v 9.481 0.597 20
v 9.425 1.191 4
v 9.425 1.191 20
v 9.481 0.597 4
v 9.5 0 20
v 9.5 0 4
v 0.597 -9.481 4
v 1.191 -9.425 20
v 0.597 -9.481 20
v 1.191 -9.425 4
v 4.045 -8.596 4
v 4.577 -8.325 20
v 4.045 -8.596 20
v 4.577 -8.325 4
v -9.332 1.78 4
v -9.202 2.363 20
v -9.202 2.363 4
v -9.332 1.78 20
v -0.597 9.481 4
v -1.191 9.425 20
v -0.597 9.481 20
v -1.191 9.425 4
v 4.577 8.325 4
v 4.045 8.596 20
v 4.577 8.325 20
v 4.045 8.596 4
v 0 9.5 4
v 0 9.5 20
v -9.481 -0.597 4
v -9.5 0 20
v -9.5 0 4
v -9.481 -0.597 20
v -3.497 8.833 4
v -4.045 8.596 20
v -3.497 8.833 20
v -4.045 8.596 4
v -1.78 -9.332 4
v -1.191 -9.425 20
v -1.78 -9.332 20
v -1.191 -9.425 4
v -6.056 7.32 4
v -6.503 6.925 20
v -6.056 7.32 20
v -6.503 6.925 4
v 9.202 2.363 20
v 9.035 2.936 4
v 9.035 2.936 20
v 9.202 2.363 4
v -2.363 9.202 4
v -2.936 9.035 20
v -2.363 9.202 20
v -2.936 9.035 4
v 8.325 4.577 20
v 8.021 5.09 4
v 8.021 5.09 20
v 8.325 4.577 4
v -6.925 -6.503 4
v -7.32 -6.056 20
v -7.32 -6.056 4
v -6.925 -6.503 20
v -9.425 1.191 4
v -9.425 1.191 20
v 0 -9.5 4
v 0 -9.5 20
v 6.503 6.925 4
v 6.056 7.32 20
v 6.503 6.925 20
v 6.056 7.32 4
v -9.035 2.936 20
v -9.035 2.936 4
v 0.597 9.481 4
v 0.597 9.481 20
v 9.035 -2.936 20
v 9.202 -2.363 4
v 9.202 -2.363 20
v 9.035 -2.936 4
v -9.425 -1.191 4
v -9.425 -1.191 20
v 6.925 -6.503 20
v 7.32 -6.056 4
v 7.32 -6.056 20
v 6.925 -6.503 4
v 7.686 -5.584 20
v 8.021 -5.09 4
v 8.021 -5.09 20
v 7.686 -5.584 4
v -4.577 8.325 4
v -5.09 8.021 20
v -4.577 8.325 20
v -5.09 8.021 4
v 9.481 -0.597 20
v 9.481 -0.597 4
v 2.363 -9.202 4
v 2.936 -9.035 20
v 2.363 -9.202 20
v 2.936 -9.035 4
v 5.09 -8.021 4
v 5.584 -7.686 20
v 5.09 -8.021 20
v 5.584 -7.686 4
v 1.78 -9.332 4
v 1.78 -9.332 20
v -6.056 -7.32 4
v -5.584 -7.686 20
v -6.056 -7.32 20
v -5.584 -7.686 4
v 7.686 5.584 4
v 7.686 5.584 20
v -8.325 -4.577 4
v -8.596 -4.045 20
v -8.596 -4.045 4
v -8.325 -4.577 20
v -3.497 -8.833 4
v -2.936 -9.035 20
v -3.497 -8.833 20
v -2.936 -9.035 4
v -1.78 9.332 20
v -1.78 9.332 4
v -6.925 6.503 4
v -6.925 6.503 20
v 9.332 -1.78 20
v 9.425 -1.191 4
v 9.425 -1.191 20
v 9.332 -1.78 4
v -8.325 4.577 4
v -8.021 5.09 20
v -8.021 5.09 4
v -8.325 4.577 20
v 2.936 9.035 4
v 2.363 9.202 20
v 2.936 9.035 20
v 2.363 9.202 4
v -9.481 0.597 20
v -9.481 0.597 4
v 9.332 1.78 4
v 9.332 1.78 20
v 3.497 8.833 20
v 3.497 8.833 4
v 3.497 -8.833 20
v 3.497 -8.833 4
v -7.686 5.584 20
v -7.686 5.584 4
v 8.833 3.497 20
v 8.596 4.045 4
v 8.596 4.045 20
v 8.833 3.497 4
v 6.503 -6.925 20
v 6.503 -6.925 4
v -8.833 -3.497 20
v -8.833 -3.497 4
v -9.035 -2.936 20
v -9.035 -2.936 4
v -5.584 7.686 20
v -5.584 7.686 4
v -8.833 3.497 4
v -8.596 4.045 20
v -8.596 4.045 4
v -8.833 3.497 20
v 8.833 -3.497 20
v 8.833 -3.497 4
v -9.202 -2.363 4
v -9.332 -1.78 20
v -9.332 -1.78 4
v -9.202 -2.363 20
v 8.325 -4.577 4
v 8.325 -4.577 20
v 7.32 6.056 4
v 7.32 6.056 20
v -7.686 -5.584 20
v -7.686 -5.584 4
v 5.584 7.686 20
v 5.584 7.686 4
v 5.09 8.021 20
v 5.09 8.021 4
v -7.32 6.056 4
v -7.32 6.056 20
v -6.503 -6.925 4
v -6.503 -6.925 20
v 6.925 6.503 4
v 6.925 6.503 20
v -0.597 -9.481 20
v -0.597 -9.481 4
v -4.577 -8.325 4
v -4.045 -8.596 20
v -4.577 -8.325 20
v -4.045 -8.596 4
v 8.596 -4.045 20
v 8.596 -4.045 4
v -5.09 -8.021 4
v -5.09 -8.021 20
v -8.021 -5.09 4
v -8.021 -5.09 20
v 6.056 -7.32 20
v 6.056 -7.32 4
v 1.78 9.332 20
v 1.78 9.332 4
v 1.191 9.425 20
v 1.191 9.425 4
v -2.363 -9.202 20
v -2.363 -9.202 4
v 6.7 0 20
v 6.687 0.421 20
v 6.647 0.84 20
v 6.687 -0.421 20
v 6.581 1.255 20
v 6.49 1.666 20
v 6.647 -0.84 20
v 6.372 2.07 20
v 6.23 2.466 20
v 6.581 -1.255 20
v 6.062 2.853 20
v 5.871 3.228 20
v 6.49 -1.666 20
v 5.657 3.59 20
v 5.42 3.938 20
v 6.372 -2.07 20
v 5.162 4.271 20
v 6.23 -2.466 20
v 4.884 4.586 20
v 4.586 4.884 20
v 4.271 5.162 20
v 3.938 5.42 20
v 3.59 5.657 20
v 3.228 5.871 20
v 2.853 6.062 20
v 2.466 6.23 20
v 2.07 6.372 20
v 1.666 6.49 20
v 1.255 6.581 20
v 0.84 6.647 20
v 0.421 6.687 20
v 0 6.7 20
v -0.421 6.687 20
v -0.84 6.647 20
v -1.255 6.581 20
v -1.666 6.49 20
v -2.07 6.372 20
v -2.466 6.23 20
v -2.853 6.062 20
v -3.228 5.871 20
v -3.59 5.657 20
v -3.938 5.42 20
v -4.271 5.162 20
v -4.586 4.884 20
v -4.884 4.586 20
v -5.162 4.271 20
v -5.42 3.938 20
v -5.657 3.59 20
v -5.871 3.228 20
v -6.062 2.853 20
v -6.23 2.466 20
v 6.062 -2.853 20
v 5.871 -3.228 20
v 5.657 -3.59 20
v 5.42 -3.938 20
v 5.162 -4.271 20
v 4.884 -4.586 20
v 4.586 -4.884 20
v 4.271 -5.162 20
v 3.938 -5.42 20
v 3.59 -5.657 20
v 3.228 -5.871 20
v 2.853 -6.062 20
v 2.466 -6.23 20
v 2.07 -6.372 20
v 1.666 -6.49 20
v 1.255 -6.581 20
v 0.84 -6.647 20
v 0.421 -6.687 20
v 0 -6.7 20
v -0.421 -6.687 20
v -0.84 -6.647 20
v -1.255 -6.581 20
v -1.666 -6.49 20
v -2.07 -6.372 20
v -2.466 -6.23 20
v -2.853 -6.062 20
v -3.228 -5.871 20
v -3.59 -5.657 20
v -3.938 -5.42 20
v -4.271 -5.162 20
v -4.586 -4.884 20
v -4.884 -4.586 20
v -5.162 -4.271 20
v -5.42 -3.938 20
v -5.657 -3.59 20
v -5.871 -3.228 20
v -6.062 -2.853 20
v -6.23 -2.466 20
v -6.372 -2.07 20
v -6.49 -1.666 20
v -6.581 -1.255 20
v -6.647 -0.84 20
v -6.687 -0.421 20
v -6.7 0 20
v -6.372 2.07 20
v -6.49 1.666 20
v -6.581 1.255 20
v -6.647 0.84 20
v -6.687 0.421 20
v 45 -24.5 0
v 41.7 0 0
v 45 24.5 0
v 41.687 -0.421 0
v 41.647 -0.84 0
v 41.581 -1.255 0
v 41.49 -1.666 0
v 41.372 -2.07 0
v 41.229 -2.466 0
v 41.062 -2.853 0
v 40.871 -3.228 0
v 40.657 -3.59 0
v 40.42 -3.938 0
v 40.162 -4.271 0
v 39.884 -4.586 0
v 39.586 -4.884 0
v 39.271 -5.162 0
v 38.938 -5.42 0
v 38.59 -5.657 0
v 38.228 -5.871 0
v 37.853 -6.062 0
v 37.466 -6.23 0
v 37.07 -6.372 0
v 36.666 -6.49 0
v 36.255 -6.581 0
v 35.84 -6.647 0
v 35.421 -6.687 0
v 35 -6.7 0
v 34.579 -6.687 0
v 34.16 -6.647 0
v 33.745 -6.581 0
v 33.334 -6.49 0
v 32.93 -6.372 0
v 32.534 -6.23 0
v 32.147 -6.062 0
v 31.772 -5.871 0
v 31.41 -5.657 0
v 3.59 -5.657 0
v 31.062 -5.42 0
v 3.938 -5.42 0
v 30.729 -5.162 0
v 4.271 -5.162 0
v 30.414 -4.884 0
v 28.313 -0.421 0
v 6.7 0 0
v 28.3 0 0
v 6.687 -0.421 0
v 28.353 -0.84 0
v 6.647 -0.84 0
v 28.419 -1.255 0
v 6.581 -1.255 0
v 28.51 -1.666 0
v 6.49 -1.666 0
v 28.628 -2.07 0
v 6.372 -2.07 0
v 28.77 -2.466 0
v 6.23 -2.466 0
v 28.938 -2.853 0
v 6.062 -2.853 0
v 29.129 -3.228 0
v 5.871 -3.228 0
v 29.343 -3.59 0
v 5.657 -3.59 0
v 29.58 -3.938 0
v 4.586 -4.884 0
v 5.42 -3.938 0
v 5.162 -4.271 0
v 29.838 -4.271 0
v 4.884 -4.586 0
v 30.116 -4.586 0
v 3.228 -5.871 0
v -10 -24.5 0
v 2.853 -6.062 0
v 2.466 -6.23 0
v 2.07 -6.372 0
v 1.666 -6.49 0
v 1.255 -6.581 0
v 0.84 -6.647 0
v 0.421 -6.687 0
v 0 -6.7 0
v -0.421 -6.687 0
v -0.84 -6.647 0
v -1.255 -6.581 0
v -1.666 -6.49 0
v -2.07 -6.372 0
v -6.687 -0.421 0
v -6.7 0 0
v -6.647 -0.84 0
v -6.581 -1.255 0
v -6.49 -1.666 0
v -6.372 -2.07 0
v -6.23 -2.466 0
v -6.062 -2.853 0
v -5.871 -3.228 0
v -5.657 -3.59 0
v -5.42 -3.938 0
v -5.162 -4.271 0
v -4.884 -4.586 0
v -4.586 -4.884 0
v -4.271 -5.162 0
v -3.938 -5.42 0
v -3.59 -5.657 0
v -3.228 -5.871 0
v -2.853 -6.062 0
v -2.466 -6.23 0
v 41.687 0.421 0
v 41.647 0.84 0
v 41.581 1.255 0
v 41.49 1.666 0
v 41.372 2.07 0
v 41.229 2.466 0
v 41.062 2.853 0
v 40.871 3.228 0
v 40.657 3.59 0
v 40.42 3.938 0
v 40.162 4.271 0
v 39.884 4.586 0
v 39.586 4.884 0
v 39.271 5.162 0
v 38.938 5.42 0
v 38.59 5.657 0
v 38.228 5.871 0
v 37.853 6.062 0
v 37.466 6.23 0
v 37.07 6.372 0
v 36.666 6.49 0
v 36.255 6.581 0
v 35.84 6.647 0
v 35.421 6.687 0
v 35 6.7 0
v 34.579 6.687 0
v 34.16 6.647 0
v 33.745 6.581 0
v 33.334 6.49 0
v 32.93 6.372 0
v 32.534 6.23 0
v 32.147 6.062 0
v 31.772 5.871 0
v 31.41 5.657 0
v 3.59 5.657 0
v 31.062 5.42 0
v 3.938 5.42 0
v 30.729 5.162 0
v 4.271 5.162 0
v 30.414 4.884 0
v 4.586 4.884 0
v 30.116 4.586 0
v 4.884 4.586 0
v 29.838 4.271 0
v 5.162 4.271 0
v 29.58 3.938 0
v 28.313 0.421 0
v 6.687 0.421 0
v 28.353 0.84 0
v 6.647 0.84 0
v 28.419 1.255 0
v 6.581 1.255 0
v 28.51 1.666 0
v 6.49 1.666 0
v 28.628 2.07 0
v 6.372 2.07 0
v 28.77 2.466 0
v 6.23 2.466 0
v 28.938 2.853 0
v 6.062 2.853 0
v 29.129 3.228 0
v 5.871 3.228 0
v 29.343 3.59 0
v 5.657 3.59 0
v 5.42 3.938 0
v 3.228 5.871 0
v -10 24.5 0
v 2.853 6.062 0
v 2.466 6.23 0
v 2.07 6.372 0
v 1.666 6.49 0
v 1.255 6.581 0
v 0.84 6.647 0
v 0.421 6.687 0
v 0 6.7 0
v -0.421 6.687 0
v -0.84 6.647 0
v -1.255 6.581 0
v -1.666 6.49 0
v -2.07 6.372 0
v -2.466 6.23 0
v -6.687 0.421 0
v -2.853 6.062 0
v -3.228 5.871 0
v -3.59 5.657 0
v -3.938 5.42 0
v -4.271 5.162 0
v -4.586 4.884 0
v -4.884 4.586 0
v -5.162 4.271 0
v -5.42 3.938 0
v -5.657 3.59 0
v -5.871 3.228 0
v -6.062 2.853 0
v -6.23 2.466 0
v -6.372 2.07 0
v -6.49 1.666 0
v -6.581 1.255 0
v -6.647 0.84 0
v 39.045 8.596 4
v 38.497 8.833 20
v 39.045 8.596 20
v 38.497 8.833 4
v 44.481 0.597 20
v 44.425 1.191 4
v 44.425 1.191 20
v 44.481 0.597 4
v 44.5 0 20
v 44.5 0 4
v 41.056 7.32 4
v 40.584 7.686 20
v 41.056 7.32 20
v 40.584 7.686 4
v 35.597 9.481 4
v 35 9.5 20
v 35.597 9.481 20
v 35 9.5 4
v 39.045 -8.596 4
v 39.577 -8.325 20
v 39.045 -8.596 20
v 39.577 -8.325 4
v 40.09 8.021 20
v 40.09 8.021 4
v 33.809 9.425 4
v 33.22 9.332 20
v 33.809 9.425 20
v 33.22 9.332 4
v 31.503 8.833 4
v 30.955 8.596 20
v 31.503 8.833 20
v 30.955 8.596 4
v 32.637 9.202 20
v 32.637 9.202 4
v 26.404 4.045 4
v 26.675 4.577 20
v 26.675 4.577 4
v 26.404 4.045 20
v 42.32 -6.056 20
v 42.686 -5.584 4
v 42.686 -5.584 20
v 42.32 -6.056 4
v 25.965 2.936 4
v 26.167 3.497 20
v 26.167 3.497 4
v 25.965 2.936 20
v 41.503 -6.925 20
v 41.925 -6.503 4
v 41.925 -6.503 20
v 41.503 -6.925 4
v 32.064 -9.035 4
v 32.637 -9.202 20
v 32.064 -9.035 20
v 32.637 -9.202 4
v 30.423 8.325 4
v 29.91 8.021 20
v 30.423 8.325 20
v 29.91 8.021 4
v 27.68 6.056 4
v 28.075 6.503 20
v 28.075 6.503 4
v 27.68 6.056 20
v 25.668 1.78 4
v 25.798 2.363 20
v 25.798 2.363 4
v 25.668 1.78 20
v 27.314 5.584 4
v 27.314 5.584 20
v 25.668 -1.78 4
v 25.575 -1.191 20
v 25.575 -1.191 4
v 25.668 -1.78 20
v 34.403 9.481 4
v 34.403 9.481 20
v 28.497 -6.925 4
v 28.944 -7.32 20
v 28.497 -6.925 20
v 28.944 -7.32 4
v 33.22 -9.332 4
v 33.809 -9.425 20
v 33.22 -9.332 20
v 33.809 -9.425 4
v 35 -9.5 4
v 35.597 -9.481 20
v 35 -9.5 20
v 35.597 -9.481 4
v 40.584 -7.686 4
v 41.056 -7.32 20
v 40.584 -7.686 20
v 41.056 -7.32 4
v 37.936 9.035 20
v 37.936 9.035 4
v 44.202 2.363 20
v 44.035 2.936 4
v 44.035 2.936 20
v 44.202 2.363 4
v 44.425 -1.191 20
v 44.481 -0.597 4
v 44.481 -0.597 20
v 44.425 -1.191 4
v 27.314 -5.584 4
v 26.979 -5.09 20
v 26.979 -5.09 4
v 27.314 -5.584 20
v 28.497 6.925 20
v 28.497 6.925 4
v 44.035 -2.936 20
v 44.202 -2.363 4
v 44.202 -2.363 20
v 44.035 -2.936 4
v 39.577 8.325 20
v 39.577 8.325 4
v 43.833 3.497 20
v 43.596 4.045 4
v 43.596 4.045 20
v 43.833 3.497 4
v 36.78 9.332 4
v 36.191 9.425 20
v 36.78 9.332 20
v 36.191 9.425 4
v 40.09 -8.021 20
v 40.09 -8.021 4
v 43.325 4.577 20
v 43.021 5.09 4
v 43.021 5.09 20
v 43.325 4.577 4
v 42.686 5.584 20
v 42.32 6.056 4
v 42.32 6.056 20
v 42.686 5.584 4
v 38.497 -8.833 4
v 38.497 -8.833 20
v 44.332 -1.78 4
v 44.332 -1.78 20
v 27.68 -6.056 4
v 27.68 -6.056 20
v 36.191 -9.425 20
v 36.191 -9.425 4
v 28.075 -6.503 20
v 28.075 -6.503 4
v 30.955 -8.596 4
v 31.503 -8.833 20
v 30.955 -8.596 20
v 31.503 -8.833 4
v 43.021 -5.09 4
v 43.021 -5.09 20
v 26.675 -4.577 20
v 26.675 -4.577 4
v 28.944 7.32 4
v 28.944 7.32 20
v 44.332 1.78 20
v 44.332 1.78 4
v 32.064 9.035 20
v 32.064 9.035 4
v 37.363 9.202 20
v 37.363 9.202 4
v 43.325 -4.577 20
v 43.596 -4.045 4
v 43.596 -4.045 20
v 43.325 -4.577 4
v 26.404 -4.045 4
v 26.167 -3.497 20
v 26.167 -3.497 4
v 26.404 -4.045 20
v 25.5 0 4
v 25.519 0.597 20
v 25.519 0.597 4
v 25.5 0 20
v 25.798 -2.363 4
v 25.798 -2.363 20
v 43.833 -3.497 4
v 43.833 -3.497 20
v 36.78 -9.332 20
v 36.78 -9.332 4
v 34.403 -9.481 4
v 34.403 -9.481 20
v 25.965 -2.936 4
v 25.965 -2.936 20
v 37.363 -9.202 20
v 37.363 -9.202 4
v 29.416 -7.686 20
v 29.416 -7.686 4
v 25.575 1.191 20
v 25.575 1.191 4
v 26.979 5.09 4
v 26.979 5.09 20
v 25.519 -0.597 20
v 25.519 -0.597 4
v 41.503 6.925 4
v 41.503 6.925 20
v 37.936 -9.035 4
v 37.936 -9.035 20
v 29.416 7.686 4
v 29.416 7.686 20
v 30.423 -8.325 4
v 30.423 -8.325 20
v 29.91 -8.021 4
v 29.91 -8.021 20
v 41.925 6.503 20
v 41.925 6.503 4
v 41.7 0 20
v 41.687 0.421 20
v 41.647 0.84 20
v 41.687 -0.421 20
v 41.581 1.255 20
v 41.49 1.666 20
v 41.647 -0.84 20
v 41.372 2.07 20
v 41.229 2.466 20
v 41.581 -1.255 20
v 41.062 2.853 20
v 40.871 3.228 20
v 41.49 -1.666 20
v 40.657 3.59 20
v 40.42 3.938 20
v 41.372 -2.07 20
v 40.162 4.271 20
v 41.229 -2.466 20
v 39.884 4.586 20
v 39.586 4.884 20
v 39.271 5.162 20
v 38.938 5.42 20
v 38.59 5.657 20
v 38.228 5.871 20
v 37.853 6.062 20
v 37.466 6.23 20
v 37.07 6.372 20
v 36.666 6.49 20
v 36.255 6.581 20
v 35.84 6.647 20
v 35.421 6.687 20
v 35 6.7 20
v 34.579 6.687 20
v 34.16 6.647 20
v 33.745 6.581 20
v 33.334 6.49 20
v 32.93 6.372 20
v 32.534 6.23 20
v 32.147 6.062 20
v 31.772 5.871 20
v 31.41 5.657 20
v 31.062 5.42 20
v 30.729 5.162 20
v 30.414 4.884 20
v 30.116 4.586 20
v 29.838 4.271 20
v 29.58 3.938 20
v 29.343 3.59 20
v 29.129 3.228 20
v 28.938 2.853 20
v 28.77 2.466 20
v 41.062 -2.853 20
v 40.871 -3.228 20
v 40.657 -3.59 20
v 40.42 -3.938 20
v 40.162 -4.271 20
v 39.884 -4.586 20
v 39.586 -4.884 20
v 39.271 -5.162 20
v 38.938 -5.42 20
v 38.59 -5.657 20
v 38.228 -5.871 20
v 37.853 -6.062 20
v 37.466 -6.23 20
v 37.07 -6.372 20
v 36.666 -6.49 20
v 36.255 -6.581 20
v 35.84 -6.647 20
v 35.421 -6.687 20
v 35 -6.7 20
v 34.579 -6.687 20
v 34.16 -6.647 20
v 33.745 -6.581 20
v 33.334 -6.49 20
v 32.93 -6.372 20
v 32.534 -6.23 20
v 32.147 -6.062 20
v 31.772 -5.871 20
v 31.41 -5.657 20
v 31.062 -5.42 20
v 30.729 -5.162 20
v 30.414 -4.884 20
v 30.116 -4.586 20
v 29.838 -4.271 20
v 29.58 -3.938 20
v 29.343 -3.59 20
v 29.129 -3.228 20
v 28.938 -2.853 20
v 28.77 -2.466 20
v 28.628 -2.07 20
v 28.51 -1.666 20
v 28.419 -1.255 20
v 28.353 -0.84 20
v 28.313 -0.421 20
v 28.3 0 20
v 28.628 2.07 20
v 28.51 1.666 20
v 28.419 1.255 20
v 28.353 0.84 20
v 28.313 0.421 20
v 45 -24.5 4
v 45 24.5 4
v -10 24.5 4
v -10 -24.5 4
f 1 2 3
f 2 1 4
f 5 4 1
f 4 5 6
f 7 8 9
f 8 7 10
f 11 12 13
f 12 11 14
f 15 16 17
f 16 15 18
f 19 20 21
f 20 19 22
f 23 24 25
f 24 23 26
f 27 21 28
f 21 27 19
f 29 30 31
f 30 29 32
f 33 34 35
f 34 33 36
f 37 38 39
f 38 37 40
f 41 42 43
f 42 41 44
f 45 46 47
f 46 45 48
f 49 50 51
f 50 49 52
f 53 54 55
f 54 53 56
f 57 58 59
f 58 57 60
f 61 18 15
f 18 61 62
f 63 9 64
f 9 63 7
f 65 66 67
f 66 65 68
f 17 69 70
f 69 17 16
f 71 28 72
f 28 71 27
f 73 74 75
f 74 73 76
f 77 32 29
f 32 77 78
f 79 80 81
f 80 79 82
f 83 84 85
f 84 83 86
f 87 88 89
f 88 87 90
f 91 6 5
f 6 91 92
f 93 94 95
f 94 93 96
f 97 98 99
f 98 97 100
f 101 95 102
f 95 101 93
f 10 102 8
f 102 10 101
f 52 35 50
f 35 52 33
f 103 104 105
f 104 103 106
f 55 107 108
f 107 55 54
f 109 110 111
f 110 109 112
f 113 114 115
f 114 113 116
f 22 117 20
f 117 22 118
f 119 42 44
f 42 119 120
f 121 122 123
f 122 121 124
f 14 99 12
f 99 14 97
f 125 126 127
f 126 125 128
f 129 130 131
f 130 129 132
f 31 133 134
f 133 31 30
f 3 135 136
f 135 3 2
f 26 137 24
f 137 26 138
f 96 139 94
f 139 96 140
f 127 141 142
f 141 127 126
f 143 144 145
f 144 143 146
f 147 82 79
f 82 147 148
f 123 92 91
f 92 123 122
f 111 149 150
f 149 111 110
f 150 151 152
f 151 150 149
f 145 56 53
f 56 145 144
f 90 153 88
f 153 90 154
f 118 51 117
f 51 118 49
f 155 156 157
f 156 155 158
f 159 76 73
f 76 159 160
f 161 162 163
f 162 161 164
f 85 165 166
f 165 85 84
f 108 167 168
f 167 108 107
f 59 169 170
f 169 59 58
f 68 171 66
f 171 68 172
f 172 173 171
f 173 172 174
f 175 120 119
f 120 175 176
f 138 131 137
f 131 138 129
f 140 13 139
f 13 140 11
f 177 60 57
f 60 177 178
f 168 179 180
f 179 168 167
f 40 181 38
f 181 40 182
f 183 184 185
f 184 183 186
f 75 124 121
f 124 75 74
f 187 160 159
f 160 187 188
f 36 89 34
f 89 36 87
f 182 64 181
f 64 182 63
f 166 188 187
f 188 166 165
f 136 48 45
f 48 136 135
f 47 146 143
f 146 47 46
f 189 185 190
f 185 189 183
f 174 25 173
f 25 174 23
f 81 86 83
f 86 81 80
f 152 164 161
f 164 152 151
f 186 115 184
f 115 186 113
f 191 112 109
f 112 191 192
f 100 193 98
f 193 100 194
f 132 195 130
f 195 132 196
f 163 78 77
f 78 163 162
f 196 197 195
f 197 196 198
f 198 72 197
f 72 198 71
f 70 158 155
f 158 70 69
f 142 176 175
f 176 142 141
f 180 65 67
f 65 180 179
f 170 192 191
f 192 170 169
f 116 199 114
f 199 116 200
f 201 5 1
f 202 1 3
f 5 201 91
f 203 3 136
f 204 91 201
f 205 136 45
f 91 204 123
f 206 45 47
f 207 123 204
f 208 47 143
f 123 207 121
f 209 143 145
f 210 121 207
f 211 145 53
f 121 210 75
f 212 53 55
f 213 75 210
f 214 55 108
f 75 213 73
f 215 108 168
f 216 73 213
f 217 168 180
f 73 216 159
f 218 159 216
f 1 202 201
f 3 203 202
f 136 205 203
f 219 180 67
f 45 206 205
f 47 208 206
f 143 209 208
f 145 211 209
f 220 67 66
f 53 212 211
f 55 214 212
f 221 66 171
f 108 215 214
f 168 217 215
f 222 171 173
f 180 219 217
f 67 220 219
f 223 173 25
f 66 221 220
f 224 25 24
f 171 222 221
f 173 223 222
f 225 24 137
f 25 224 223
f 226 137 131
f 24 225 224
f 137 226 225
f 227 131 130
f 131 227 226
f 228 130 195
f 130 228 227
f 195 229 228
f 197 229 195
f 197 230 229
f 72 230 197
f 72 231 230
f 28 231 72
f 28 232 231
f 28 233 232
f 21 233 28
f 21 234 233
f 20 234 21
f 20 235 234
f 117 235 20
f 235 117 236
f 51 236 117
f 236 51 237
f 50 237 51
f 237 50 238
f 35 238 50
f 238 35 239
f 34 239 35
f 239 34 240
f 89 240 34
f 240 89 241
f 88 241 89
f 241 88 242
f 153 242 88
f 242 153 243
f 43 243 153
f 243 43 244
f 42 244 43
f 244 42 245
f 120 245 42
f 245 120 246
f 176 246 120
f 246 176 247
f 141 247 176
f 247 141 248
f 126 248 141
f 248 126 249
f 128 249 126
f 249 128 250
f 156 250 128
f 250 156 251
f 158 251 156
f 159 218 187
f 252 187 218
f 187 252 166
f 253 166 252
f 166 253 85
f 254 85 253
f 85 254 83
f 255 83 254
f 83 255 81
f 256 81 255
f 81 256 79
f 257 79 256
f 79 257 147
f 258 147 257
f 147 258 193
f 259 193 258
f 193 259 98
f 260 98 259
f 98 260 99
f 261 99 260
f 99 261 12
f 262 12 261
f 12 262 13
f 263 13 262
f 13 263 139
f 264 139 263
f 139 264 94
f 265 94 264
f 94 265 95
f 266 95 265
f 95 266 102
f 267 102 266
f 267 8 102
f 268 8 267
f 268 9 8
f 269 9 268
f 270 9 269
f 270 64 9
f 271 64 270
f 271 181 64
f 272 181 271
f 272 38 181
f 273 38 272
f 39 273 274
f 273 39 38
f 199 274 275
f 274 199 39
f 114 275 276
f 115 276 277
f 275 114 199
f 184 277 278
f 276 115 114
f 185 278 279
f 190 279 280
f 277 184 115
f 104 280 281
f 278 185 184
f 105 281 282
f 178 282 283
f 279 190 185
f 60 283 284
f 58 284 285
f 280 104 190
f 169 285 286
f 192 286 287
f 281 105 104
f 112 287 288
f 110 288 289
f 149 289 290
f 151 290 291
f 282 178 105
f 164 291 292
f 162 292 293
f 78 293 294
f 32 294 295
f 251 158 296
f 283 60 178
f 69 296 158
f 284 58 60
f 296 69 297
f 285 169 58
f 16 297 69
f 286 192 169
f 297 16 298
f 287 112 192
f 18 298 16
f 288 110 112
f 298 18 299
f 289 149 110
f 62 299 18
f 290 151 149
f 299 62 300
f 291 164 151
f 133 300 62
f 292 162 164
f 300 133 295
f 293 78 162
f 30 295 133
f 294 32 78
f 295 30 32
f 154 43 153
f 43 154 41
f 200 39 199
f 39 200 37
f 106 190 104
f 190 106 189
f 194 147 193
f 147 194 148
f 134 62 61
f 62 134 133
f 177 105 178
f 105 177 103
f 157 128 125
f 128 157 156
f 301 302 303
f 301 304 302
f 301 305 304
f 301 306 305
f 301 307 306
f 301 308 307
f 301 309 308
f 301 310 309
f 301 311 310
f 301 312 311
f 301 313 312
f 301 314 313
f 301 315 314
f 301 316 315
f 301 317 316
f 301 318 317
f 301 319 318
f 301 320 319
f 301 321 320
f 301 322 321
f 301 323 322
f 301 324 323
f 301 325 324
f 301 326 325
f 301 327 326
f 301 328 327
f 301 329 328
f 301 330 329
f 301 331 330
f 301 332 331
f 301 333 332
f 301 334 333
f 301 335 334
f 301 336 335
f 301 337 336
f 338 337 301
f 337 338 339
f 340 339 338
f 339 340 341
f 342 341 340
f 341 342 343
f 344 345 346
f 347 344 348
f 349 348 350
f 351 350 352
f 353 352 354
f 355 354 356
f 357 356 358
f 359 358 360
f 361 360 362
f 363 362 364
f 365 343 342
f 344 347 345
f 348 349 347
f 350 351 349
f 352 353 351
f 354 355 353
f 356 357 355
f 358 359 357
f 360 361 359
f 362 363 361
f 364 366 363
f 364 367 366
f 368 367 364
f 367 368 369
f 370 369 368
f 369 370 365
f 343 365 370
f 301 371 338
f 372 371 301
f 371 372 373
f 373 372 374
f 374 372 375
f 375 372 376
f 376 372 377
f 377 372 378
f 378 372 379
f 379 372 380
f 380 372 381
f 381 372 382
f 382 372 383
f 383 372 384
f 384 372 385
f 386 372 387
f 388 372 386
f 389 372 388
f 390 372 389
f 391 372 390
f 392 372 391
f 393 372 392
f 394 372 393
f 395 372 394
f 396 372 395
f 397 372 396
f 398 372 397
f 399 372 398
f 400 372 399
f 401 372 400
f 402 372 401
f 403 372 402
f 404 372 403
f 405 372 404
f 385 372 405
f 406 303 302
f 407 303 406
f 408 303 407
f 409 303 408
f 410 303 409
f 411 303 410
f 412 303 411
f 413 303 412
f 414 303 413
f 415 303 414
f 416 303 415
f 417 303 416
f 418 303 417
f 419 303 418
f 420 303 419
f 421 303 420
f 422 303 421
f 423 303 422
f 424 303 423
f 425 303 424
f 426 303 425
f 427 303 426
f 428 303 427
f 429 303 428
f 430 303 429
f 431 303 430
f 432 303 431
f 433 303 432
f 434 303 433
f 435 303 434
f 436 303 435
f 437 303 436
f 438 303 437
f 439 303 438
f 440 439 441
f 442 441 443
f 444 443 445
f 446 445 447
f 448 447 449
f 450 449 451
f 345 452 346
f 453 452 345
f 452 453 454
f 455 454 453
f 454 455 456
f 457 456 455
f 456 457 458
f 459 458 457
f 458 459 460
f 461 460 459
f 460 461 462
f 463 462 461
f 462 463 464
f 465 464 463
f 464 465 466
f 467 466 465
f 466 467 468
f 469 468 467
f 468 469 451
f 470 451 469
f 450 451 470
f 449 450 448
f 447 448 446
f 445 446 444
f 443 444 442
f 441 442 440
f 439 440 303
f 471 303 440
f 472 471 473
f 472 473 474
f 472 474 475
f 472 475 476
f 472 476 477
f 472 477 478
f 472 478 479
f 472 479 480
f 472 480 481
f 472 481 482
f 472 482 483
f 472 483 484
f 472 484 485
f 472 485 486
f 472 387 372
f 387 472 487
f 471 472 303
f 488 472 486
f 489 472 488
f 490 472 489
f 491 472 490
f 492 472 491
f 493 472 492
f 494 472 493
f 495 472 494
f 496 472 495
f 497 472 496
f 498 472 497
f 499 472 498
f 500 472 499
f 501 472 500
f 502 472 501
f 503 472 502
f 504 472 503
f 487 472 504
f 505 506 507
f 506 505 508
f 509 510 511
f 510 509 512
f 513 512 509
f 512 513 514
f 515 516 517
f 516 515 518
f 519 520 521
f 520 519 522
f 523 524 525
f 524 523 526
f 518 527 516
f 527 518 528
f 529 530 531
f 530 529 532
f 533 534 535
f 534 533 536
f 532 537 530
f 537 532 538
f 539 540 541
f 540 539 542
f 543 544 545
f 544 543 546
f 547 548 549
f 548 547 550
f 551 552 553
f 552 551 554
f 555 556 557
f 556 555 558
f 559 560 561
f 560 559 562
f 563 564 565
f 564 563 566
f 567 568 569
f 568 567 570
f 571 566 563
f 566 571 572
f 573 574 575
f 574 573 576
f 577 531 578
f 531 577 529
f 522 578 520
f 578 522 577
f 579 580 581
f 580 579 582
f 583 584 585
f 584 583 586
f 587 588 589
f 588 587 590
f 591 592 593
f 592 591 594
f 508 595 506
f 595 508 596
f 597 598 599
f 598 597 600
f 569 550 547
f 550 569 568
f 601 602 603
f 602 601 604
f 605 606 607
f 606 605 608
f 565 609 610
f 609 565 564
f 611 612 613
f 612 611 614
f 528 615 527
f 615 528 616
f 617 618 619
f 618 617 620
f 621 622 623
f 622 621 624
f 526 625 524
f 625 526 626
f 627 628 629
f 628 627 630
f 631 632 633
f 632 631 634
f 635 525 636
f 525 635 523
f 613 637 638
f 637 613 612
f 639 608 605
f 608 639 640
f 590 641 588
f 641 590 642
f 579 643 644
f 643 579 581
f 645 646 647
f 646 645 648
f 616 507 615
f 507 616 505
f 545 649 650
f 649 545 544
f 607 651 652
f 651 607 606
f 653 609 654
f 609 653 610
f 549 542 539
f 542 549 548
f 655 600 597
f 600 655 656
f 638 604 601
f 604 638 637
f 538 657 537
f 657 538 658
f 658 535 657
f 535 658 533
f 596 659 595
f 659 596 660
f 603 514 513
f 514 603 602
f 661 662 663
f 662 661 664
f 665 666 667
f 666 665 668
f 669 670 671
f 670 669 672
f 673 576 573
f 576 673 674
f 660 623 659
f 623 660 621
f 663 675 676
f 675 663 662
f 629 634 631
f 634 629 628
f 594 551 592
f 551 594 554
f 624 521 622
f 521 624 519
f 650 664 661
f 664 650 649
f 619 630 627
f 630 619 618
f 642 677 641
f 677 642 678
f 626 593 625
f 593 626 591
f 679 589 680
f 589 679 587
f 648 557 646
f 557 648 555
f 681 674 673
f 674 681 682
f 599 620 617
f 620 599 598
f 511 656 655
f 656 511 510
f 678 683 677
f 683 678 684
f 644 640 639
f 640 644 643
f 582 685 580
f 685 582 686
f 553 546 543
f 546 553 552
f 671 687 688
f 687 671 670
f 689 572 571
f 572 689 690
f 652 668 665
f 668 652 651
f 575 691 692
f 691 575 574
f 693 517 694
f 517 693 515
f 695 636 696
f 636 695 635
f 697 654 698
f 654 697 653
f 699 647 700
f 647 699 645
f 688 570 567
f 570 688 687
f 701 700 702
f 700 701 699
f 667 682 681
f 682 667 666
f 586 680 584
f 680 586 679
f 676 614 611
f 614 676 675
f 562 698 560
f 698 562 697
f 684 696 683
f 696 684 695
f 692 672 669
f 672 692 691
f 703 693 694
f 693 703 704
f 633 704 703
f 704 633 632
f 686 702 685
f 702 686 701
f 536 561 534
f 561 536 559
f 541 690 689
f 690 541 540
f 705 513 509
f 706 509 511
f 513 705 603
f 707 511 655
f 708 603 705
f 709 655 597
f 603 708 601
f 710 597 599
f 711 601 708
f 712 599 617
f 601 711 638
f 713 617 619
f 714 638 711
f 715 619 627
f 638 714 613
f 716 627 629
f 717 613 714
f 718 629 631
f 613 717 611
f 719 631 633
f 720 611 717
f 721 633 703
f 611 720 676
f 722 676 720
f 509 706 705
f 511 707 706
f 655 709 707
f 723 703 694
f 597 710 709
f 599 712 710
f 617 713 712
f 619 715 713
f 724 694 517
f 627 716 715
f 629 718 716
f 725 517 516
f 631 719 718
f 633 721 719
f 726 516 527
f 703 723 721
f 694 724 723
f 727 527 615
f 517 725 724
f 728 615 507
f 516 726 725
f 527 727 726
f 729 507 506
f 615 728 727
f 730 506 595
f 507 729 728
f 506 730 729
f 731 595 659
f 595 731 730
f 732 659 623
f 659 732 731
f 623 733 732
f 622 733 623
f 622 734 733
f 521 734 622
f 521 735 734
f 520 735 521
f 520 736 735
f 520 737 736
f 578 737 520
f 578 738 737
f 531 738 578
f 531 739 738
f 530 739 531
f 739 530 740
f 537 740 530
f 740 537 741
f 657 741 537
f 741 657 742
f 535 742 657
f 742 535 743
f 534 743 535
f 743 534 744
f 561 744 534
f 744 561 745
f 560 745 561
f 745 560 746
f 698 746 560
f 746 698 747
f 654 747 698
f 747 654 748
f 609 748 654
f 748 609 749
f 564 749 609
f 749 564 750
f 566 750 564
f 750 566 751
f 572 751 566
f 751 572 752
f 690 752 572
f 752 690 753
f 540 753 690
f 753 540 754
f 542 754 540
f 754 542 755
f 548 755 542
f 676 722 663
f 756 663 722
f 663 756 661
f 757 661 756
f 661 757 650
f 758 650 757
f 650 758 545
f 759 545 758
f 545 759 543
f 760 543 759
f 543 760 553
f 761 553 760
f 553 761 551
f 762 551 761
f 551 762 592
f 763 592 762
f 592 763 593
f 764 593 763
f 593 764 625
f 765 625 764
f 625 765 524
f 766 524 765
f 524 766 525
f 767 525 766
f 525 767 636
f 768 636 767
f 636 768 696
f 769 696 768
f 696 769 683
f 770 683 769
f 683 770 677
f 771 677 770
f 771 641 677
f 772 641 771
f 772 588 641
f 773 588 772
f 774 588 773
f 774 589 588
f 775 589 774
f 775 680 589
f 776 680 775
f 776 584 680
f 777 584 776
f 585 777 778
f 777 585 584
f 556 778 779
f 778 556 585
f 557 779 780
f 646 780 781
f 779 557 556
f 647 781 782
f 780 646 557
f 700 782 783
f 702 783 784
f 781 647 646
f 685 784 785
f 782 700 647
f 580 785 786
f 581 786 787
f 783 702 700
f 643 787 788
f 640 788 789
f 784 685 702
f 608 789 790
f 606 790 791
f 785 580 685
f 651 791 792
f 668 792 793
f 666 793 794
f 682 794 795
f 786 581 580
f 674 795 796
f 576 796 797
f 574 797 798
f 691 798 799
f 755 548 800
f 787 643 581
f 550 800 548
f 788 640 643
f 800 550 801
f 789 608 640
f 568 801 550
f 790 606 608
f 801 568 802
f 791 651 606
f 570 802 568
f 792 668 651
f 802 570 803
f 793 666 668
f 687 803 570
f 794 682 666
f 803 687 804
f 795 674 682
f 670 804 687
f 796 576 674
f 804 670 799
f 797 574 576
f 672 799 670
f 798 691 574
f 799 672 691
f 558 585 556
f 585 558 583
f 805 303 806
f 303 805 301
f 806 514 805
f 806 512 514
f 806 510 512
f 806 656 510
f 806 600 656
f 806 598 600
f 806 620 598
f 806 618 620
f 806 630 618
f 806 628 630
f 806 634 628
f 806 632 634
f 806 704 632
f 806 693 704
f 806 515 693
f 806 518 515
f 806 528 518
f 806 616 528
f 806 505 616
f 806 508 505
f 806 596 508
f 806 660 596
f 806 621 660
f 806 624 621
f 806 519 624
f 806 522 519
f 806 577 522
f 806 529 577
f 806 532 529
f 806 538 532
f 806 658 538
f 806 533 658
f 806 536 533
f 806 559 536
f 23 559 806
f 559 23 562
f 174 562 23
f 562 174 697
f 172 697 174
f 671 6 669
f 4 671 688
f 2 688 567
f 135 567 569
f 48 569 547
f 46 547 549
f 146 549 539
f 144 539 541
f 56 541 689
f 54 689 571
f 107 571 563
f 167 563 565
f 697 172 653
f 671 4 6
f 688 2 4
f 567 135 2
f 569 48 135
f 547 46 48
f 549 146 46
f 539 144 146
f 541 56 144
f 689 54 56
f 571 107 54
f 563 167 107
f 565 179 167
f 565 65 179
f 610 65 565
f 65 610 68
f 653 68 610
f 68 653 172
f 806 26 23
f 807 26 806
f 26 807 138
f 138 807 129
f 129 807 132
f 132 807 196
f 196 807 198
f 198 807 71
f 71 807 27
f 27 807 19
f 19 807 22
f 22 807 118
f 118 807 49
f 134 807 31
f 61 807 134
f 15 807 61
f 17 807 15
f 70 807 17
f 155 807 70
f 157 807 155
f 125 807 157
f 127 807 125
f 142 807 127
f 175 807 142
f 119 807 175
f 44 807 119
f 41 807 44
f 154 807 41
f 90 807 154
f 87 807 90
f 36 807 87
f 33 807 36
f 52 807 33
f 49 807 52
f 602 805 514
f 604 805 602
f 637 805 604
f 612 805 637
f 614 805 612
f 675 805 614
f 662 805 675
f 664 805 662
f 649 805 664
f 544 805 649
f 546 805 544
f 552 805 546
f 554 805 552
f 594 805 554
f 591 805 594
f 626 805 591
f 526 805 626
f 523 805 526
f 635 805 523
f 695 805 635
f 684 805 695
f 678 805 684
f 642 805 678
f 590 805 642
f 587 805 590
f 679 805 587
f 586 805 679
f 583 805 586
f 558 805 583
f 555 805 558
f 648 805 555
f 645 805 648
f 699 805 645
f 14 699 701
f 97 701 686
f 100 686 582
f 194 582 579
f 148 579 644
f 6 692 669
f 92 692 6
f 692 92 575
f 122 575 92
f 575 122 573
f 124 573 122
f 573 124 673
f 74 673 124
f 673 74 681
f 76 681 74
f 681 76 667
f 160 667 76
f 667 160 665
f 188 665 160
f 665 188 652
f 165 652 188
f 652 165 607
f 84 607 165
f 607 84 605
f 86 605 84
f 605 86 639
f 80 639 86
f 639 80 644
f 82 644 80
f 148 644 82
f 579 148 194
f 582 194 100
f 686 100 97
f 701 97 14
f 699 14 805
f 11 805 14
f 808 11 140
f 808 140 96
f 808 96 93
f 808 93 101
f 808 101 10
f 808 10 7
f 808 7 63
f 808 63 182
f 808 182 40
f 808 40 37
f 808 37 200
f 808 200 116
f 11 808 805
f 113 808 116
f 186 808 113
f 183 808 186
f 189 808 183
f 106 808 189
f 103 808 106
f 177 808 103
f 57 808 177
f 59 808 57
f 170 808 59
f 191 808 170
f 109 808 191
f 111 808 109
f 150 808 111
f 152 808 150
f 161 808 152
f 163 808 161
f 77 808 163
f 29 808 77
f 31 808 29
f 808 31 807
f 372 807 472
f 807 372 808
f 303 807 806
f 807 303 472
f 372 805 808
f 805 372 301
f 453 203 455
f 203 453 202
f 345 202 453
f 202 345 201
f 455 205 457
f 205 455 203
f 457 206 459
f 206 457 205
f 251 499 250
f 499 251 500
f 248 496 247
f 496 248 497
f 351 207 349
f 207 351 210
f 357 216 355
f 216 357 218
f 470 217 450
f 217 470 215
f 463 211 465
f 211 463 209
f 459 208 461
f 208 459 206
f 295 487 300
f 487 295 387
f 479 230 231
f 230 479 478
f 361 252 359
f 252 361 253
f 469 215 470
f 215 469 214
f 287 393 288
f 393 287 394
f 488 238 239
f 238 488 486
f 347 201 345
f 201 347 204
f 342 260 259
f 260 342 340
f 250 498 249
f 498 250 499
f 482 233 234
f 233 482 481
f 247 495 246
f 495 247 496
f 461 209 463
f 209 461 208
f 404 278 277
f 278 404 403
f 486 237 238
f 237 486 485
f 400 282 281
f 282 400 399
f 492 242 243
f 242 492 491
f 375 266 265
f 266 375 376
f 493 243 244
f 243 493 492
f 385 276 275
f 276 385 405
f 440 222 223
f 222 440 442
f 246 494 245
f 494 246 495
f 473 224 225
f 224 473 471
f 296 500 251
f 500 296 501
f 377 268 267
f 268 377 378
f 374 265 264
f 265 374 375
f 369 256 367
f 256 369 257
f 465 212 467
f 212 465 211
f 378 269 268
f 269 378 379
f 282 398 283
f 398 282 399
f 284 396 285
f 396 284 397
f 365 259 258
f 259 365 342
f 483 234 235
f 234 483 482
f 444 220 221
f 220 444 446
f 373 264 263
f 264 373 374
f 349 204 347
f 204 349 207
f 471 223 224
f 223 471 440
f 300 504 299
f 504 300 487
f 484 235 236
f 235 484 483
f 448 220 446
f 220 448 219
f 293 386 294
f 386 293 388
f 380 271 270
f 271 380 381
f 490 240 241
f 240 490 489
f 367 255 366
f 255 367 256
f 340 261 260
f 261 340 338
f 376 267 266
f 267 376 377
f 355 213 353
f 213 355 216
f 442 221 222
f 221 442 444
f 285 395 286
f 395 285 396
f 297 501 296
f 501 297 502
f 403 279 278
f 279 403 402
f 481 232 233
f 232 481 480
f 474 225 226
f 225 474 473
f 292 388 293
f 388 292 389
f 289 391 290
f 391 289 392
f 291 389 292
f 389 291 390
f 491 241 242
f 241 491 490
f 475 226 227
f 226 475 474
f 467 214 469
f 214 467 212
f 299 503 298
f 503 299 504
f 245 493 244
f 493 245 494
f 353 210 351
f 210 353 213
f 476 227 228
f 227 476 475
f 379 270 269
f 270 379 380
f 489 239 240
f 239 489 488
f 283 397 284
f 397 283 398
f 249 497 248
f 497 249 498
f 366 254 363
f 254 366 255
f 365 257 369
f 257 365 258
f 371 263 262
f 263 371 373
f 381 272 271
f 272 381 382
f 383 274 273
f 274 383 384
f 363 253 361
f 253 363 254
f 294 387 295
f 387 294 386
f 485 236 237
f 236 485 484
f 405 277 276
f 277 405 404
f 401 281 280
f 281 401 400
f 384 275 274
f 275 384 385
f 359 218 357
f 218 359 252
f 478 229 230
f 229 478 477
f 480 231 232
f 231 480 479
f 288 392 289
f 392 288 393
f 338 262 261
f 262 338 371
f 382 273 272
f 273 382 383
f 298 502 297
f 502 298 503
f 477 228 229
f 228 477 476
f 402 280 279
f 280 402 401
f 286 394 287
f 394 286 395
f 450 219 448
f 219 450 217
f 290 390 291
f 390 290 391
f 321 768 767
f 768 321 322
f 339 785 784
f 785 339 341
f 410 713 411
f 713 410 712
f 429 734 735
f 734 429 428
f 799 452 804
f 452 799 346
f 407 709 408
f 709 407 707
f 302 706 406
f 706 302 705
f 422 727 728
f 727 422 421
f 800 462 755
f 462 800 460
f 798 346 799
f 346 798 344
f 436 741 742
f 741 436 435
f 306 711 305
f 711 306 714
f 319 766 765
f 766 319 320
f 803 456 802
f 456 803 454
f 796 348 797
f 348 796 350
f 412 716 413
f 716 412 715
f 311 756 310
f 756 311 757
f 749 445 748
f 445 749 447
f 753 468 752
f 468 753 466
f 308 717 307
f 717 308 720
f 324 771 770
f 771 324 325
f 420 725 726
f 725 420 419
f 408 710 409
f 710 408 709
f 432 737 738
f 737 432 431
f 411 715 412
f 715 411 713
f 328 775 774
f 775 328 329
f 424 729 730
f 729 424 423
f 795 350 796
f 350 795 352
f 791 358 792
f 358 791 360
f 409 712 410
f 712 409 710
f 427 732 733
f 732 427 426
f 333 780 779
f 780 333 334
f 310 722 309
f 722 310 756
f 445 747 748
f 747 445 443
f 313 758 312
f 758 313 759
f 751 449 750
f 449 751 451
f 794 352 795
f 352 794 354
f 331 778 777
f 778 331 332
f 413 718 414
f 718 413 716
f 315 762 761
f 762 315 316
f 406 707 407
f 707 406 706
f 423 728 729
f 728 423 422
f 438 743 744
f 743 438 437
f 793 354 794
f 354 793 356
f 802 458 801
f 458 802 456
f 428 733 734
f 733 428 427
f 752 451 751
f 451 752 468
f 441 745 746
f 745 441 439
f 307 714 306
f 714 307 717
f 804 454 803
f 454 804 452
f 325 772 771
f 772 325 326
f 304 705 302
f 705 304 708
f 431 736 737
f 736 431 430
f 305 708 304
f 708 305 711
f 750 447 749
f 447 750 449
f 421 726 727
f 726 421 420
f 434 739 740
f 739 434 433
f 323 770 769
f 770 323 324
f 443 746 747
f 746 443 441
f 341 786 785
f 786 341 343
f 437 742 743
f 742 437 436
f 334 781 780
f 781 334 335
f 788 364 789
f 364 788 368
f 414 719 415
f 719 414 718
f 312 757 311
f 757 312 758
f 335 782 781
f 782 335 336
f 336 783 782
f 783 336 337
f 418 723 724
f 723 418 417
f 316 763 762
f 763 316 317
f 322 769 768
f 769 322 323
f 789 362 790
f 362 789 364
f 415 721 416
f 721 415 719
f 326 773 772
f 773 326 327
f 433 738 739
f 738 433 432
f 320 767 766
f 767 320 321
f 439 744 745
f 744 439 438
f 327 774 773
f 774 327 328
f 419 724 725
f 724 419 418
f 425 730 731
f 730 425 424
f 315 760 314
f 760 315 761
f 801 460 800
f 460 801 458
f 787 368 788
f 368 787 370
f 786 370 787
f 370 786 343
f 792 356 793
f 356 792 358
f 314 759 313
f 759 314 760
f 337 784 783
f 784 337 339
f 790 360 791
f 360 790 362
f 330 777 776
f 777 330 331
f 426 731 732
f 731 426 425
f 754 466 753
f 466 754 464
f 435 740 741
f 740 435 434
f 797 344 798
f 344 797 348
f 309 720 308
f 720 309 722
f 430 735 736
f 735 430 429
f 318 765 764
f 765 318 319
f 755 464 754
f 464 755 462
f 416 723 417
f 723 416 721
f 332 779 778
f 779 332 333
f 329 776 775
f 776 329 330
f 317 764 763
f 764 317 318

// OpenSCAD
difference(){
	union(){
        
       translate([0,0,0]){
            rotate(a = [0,0,0]) {
                cylinder(h=20, r=9.5, $fn=100, center=false);
            }
       }		   
       translate([13+22,0,0]){
            rotate(a = [0,0,0]) {
                cylinder(h=20, r=9.5, $fn=100, center=false);
            }
       }		   
        translate([-10,-24.5,0]){
           cube([55,49,4], center=false);
        }	   

	}
	union() {
       translate([0,0,-10]){
            rotate(a = [0,0,0]) {
                cylinder(h=600, r=6.7, $fn=100, center=false);
            }
       }			   
       translate([13+22,0,-10]){
            rotate(a = [0,0,0]) {
                cylinder(h=600, r=6.7, $fn=100, center=false);
            }
       }			   

        
	}
}
